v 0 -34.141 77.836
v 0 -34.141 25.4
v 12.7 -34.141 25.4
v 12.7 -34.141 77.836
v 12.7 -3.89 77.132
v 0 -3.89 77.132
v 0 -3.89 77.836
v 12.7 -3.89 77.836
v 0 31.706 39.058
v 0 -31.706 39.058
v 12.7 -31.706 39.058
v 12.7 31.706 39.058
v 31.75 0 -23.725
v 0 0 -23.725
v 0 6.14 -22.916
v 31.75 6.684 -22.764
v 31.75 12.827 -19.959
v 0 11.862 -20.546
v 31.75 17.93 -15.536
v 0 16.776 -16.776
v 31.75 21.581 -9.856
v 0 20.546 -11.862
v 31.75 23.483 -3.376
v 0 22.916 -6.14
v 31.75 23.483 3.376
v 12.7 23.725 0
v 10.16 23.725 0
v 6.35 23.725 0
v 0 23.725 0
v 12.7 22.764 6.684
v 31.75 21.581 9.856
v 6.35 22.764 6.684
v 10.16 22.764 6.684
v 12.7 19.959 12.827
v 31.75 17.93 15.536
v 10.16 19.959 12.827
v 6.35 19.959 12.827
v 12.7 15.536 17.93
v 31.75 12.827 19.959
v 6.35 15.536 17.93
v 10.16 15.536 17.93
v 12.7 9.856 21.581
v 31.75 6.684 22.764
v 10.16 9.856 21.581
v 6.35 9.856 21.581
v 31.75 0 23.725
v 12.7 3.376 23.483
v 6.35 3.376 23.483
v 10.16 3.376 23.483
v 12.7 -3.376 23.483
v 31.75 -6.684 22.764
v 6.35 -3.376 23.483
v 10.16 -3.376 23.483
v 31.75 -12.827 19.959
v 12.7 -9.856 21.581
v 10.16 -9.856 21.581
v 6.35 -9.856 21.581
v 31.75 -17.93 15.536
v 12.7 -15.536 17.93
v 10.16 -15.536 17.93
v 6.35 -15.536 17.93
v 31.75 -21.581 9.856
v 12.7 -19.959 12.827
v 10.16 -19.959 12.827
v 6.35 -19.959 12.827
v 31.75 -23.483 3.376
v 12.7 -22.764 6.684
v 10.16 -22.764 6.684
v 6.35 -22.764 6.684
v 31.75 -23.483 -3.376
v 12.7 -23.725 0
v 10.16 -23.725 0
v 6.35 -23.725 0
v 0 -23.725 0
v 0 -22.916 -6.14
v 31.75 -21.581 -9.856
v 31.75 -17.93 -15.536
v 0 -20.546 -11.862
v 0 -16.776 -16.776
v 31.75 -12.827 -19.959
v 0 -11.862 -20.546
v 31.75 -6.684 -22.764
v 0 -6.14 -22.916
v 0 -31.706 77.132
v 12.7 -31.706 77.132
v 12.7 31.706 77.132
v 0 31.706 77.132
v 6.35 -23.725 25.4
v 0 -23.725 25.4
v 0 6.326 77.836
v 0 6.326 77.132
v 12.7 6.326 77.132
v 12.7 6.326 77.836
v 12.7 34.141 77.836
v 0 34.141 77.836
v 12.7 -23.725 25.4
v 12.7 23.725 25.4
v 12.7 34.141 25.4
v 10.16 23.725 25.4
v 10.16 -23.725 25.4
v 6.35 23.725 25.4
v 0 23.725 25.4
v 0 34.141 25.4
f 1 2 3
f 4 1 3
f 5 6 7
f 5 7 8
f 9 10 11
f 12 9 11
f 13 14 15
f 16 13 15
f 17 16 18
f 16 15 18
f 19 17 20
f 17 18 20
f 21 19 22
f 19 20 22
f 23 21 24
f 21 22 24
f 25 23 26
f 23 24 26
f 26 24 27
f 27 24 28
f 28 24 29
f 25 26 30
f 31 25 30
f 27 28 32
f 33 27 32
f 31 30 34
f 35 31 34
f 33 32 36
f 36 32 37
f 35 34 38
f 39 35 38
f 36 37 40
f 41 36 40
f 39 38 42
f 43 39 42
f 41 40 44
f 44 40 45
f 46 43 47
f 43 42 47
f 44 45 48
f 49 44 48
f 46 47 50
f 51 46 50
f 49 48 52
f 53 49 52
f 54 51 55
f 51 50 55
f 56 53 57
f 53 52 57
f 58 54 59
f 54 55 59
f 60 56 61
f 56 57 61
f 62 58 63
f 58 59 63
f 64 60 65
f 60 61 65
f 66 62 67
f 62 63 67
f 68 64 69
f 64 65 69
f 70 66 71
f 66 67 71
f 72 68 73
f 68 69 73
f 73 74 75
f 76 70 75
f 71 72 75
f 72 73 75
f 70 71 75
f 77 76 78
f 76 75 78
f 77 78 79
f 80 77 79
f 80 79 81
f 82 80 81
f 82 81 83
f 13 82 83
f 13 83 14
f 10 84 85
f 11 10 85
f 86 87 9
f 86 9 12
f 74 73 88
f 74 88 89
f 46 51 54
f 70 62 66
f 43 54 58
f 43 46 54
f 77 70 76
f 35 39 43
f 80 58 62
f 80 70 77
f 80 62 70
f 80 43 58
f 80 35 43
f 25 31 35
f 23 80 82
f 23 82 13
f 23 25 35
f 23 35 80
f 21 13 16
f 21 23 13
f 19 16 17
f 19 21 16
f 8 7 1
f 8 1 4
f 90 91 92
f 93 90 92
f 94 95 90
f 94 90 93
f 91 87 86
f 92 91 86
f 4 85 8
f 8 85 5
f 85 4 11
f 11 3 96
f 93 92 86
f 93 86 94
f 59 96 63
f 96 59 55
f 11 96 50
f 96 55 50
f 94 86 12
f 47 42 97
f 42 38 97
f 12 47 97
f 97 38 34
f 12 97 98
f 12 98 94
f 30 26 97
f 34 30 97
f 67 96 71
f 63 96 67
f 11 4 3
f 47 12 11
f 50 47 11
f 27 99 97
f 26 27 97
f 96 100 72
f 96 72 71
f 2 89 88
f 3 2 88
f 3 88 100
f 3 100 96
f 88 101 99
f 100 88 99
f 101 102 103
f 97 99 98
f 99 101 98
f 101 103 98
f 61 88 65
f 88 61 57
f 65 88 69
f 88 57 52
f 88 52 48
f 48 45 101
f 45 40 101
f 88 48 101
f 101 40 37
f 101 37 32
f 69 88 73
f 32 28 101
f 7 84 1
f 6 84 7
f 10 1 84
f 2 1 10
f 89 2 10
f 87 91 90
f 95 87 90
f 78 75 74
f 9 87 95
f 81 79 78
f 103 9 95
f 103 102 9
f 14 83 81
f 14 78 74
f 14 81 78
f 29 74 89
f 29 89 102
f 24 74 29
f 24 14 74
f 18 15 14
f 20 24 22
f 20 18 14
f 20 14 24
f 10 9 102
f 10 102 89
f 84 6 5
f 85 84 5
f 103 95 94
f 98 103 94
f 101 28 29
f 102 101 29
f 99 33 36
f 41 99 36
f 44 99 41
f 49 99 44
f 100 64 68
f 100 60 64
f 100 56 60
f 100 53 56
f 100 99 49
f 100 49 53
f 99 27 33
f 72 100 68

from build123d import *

# Parameters (mm, degrees)
SKETCH1_R                = 23.72487
BOSS_EXTRUDE1_DEPTH      = 31.75
SKETCH2_W                = 47.44974
SKETCH2_H                = 6.35
BOSS_EXTRUDE2_DEPTH      = 25.4
SKETCH3_W                = 12.7
SKETCH3_H                = 68.28282
BOSS_EXTRUDE3_DEPTH      = 13.65758
SKETCH4_W                = 12.7
SKETCH4_H                = 2.43586
BOSS_EXTRUDE4_DEPTH      = 38.0746
SKETCH5_W                = 12.7
SKETCH5_H                = 27.81554
SKETCH5_H_2              = 30.2514
BOSS_EXTRUDE5_DEPTH      = 0.70358
BOSS_EXTRUDE8_REACH      = 72.166
BOSS_EXTRUDE8_END_RADIUS = 23.72487
SKETCH9_W                = 2.54
SKETCH9_H                = 47.44974


with BuildPart() as part:
    # Sketch1 → Boss-Extrude1 (new body)
    with BuildSketch(Plane.YZ):
        with Locations(Location((0, 0, 0), (0, 0, 270))):
            Circle(SKETCH1_R)
    extrude(amount=BOSS_EXTRUDE1_DEPTH)

    # Sketch2 → Boss-Extrude2 (add)
    with BuildSketch(Plane(origin=(0, 0, 0), x_dir=(0, 1, 0), z_dir=(0, 0, 1))):
        with Locations((0, -3.175)):
            Rectangle(SKETCH2_W, SKETCH2_H)
    extrude(amount=BOSS_EXTRUDE2_DEPTH)

    # Sketch3 → Boss-Extrude3 (add)
    with BuildSketch(Plane.XY.offset(25.4)):
        with Locations((6.35, 0)):
            Rectangle(SKETCH3_W, SKETCH3_H)
    extrude(amount=BOSS_EXTRUDE3_DEPTH)

    # Sketch4 → Boss-Extrude4 (add)
    with BuildSketch(Plane.XY.offset(39.05758)):
        with Locations((6.35, 32.92348)):
            Rectangle(SKETCH4_W, SKETCH4_H)
        with Locations((6.35, -32.92348)):
            Rectangle(SKETCH4_W, SKETCH4_H)
    extrude(amount=BOSS_EXTRUDE4_DEPTH)

    # Sketch5 → Boss-Extrude5 (add)
    with BuildSketch(Plane.XY.offset(77.13218)):
        with Locations((6.35, 20.23364)):
            Rectangle(SKETCH5_W, SKETCH5_H)
        with Locations((6.35, -19.01571)):
            Rectangle(SKETCH5_W, SKETCH5_H_2)
    extrude(amount=BOSS_EXTRUDE5_DEPTH)

    # Boss-Extrude8: up to this cylinder (the profile starts outside it)
    boss_extrude8_end = Plane(origin=(11.43, 0, 0), z_dir=(-1, 0, 0)) * Cylinder(BOSS_EXTRUDE8_END_RADIUS, 192.78174, mode=Mode.PRIVATE)
    # Sketch9 → Boss-Extrude8 (add, up to the surface)
    with BuildSketch(Plane(origin=(0, 0, 25.4), x_dir=(1, 0, 0), z_dir=(0, 0, -1)), mode=Mode.PRIVATE) as boss_extrude8_sk1:
        with Locations((11.43, 0)):
            Rectangle(SKETCH9_W, SKETCH9_H)
    boss_extrude8_tool1 = extrude(boss_extrude8_sk1.sketch, amount=BOSS_EXTRUDE8_REACH, mode=Mode.PRIVATE) - boss_extrude8_end
    add(boss_extrude8_tool1.solids().sort_by_distance((11.43, 0, 25.4))[0])


solid = part.part
